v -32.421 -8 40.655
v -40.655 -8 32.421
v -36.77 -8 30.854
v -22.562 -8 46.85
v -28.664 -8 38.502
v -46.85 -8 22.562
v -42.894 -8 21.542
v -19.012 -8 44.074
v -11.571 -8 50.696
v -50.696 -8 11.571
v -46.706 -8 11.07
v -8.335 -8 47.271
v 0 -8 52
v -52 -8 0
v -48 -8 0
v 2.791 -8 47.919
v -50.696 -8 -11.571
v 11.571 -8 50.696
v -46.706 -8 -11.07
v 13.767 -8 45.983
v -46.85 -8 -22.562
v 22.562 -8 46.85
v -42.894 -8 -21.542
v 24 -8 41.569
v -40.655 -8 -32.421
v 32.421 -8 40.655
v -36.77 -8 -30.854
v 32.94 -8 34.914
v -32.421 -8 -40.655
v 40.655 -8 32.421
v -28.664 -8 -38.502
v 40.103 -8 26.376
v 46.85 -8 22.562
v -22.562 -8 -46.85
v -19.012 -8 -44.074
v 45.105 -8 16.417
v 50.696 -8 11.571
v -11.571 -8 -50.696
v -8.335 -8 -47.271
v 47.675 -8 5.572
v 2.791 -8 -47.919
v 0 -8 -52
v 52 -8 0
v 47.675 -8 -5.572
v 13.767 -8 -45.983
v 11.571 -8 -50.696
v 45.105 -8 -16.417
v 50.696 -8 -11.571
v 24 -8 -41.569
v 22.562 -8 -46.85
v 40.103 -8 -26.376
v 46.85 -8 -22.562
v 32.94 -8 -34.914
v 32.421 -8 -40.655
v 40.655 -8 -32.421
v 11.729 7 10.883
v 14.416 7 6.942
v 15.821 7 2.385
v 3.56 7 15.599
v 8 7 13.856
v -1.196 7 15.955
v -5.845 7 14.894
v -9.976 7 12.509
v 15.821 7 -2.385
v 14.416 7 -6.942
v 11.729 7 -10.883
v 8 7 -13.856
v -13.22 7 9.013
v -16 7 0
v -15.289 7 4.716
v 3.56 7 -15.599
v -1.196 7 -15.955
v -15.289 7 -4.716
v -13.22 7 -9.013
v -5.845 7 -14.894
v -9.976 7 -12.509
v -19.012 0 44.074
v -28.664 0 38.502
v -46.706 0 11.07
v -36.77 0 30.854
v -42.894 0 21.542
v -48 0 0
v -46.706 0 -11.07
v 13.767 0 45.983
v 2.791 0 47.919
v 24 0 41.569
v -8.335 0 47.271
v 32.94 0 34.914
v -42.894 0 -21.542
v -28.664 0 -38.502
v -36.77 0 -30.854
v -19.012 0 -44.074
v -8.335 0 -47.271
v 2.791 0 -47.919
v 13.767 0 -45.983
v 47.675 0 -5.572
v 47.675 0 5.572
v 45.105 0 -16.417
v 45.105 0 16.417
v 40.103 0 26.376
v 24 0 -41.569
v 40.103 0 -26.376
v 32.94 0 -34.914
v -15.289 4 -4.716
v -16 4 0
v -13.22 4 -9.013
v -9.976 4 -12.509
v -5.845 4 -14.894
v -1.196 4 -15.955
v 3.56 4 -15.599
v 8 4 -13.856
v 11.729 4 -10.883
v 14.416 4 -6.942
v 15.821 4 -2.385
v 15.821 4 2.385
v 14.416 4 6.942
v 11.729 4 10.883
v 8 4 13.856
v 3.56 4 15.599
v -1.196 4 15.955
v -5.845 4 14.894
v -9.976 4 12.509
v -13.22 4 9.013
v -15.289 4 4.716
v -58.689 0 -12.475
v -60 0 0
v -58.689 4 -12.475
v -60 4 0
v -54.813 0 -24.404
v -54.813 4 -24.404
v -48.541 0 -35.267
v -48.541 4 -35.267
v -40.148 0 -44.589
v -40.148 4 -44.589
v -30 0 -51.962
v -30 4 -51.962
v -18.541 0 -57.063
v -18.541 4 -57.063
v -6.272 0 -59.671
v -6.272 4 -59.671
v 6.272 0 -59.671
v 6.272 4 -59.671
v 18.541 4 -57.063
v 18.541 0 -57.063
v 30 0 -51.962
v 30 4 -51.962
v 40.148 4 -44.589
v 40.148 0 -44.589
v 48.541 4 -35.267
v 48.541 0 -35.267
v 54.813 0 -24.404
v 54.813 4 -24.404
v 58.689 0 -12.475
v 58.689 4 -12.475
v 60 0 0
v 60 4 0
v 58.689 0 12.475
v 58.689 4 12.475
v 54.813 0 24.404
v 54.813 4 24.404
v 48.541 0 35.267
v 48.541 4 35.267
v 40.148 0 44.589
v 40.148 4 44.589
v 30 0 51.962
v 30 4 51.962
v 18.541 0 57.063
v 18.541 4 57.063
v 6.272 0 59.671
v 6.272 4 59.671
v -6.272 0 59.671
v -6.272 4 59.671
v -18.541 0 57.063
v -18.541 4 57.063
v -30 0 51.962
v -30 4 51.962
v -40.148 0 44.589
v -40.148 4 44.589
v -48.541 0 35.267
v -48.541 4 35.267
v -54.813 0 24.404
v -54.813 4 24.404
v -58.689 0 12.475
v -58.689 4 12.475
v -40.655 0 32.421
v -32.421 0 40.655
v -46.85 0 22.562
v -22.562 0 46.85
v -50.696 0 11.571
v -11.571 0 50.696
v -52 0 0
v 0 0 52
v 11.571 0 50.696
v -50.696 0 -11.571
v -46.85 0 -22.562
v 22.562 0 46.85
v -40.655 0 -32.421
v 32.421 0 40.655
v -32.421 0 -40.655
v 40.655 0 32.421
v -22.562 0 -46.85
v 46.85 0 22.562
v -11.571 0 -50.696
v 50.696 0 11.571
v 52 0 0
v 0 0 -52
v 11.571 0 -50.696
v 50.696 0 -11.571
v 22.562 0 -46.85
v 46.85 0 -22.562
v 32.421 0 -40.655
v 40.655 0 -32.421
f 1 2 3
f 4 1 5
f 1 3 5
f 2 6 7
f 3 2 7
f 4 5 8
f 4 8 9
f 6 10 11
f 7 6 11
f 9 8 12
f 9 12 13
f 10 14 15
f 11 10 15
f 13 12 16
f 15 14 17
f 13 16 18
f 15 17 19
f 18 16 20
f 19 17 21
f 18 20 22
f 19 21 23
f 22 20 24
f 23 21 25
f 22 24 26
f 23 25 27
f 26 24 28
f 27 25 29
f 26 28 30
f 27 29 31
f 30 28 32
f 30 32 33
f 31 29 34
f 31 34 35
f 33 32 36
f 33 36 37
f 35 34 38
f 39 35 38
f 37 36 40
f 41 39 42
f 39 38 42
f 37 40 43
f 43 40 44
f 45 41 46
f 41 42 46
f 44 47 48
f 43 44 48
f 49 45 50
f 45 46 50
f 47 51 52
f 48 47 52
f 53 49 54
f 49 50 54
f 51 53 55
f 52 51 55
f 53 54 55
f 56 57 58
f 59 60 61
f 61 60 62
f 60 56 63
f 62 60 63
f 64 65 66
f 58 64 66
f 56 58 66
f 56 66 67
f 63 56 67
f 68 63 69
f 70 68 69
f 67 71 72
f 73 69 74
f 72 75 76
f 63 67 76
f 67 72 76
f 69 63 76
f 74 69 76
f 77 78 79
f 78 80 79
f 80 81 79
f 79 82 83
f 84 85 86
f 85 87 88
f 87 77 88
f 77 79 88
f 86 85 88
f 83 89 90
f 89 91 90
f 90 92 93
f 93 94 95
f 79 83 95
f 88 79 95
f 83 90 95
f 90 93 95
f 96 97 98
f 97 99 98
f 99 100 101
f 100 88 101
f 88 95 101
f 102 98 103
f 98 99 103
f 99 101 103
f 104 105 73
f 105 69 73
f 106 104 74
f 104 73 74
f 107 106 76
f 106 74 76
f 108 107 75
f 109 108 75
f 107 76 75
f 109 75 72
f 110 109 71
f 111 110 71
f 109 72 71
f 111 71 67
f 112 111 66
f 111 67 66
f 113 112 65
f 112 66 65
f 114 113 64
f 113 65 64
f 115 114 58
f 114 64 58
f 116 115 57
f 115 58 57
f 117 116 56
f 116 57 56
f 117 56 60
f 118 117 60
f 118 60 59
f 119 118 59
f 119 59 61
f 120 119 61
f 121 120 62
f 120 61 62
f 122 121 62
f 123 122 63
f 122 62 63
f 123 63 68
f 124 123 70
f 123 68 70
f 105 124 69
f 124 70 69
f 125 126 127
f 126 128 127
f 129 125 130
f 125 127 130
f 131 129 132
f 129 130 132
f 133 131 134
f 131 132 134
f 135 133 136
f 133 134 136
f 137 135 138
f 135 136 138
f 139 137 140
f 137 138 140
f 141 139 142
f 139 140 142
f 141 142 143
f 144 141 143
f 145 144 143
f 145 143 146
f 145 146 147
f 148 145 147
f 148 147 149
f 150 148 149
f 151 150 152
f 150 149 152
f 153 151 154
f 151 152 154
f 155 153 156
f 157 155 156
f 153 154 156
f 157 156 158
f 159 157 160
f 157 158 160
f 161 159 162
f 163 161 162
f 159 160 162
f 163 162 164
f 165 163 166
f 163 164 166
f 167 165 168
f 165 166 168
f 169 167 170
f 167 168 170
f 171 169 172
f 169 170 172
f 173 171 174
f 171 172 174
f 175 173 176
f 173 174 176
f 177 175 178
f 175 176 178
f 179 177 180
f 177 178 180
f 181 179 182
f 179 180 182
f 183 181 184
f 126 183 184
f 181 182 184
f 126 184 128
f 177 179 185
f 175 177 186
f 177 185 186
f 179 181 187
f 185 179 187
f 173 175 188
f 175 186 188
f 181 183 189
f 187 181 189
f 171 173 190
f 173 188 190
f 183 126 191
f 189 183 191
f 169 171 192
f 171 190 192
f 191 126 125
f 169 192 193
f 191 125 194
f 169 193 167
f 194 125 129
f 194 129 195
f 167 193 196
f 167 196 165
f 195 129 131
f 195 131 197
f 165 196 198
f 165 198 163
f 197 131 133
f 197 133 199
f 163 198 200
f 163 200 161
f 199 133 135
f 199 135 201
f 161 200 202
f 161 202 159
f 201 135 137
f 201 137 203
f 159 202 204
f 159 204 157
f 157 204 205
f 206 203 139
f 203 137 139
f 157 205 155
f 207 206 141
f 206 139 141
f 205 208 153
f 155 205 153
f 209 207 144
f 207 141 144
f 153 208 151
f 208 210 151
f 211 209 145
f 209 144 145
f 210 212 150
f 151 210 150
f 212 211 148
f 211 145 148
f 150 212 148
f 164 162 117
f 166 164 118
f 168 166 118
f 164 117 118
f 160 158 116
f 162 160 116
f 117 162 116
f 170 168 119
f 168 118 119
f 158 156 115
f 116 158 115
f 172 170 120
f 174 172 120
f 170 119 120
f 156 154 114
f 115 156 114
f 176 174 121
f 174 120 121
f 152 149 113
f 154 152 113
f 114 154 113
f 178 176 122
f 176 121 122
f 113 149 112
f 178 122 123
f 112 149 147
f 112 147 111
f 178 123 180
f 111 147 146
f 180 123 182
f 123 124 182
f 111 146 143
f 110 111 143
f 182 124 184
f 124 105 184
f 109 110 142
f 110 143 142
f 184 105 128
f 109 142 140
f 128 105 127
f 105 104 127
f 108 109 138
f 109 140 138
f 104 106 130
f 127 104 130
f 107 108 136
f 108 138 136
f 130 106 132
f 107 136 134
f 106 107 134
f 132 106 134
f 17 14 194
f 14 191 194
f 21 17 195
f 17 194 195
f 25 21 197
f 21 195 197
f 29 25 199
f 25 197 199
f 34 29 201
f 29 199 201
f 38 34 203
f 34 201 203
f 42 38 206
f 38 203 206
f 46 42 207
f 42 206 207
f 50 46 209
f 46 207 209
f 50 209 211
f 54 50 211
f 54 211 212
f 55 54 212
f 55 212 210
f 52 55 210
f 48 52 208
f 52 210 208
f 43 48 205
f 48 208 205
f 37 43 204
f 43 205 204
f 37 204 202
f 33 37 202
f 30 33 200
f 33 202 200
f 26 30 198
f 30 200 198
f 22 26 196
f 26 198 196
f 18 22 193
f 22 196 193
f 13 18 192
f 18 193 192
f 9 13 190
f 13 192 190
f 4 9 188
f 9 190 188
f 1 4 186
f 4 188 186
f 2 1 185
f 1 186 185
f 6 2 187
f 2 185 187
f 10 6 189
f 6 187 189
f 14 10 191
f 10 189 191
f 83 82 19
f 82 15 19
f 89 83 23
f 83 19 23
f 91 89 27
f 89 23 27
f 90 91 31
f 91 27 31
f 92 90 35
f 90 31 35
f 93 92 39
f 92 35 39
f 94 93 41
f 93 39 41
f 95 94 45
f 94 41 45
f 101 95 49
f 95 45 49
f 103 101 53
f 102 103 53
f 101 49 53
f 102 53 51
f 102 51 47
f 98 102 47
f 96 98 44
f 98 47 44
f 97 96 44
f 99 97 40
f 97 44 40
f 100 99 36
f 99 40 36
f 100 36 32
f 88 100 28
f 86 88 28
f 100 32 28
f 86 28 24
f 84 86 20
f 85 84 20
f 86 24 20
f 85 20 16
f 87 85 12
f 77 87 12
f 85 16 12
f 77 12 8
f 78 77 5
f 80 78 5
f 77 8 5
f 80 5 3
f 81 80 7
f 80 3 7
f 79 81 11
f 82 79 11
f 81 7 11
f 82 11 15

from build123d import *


with BuildPart() as part:
    # Sketch1 → Lid Revolve (revolve)
    with BuildSketch(Plane.XY, mode=Mode.PRIVATE) as lid_revolve_sk:
        Polygon((0, 0), (48, 0), (48, -8), (52, -8), (52, 0), (60, 0), (60, 4), (16, 4), (16, 7), (0, 7), align=None)
    revolve(lid_revolve_sk.sketch.rotate(Axis((0, 7, 0), (0, -1, 0)), 180), axis=Axis((0, 7, 0), (0, -1, 0)))


solid = part.part
